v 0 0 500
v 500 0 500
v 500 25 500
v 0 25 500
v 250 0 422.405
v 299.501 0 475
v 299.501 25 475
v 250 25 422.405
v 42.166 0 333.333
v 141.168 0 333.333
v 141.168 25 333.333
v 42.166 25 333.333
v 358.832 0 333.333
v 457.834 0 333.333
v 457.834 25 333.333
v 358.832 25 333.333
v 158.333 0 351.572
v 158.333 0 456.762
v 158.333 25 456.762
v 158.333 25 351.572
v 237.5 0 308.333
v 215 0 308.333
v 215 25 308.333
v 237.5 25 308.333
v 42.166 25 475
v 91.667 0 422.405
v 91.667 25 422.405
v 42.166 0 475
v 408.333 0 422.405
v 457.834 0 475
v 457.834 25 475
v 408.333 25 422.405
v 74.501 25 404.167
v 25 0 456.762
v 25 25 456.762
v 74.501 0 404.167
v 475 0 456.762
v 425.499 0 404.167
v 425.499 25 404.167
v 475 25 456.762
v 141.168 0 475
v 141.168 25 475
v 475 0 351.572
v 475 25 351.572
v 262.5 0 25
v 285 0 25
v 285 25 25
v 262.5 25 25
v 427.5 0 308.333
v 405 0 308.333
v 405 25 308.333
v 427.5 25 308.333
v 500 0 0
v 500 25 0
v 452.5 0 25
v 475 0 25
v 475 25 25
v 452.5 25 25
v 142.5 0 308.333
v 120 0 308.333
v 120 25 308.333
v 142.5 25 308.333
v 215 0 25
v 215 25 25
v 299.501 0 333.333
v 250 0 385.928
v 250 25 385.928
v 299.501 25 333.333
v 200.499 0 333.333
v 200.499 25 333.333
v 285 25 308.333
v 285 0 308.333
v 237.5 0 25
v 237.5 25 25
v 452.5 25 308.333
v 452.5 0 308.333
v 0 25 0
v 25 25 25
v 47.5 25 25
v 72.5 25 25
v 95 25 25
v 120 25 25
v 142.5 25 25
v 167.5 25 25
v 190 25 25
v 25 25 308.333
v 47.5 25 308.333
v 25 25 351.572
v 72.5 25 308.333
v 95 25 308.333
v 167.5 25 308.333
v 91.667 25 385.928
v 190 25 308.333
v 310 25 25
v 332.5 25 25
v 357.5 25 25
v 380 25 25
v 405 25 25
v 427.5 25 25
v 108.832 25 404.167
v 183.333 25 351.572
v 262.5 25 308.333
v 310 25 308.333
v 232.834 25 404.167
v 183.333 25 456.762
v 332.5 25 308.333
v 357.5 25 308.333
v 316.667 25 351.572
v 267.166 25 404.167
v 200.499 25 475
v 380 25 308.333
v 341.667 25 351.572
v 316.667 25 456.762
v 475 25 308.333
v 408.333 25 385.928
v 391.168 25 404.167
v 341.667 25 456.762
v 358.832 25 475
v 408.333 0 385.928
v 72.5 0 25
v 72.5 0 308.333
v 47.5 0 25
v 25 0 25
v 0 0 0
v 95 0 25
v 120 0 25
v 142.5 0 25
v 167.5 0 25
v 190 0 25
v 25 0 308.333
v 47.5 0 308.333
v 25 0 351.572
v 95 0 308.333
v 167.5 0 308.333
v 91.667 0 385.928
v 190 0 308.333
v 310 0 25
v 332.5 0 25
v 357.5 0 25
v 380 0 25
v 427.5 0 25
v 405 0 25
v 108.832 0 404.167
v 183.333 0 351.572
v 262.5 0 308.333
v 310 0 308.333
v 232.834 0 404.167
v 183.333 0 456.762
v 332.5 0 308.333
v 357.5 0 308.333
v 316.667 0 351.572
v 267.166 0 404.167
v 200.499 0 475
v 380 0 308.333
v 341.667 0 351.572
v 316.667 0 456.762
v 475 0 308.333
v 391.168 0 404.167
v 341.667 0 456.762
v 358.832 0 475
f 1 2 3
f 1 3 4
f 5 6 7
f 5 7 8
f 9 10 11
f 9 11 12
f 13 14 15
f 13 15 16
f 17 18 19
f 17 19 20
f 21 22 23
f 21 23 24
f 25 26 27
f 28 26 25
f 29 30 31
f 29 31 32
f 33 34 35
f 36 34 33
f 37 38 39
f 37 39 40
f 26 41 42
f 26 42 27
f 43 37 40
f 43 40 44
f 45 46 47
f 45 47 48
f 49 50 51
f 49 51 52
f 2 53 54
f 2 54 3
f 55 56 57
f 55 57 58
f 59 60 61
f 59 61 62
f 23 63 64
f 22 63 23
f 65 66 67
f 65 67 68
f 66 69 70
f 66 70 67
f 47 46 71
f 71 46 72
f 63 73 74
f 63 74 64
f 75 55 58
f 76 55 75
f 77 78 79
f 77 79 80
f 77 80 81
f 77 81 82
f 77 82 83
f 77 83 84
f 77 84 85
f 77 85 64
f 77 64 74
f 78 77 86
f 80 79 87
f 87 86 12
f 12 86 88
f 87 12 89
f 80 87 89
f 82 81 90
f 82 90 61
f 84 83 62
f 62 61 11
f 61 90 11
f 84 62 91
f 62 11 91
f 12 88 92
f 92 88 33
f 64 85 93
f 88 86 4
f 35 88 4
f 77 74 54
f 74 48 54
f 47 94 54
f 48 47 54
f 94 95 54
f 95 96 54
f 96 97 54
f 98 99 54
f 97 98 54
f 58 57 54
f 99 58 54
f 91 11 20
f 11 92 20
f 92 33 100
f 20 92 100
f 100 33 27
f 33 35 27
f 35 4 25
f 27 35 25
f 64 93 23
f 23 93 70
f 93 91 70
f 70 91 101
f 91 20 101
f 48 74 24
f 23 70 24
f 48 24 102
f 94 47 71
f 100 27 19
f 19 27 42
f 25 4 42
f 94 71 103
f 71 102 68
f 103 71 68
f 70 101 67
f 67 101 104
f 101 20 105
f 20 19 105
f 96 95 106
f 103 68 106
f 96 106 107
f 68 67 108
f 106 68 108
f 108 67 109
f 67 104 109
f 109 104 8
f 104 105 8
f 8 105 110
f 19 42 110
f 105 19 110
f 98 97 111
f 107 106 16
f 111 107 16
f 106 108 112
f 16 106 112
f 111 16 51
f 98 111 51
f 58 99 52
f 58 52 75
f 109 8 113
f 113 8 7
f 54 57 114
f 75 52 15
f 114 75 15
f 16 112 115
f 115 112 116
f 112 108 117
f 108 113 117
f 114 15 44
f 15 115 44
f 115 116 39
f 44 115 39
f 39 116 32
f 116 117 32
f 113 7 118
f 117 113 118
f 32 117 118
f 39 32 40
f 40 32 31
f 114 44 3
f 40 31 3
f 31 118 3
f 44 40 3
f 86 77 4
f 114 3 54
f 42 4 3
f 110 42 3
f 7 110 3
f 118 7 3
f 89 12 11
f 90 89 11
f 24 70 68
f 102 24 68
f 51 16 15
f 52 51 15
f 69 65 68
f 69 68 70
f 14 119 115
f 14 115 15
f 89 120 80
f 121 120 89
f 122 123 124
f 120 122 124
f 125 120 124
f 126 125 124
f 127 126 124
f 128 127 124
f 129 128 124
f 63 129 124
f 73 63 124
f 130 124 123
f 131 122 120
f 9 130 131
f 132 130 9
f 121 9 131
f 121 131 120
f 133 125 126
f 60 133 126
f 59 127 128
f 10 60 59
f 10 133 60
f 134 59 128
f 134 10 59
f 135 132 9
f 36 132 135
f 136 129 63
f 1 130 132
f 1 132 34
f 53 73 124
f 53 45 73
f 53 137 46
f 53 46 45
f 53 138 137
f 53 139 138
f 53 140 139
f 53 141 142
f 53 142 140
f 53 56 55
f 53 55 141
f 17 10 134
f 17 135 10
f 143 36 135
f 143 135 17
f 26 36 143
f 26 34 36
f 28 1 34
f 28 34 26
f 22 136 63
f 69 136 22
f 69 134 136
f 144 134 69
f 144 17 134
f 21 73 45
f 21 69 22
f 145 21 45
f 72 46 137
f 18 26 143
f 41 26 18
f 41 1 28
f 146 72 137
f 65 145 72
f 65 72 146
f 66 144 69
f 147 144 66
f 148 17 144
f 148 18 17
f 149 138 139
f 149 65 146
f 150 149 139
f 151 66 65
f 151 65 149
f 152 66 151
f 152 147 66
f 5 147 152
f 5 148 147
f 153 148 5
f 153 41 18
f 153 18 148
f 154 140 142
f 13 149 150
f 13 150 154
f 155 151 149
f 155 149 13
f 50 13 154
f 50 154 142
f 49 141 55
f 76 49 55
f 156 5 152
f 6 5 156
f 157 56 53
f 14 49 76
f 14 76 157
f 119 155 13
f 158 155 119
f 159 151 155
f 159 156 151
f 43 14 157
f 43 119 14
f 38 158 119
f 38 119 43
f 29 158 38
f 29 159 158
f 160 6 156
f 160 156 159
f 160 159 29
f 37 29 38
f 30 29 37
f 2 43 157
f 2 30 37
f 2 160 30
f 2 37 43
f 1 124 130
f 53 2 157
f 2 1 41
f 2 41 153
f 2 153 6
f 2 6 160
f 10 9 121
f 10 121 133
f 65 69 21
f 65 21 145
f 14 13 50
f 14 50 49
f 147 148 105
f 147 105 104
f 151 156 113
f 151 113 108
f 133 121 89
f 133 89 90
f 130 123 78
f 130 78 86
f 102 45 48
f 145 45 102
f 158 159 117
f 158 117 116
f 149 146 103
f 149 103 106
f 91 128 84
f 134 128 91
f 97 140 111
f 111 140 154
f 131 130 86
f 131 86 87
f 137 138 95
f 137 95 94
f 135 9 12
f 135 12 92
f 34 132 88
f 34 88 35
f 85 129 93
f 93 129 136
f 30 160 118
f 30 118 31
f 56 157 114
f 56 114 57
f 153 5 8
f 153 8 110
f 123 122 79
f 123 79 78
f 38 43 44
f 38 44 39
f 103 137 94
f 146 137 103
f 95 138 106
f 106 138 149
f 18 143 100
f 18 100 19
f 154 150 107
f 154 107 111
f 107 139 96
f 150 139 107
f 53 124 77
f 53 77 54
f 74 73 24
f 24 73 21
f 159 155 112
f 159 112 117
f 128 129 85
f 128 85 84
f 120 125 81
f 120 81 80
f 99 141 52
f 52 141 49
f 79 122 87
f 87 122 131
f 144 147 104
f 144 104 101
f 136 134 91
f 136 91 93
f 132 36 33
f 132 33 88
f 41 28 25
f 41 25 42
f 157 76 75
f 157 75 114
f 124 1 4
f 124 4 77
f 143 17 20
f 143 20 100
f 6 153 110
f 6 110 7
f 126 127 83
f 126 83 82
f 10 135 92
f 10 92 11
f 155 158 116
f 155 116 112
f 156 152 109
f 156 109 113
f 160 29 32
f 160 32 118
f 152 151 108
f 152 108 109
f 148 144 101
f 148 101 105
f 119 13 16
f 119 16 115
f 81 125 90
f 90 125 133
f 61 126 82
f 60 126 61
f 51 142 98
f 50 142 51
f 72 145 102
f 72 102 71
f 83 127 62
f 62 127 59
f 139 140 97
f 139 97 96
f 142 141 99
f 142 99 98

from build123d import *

# Parameters (mm, degrees)
F0_W     = 25
F0_H     = 283.3333333333
F1_DEPTH = 25


with BuildPart() as f1:
    # F0 (on Front) → F1 (new body)
    with BuildSketch(Plane.XZ):
        Polygon((0, 500), (0, 0), (25, 25), (25, 308.3333333333), (25, 333.3333333333), (25, 351.5717982238), (25, 456.7615351095), (25, 475), align=None)
        Polygon((500, 500), (0, 500), (25, 475), (42.1656140146, 475), (141.1677193187, 475), (158.3333333333, 475), (183.3333333333, 475), (200.4989473479, 475), (299.5010526521, 475), (316.6666666667, 475), (341.6666666667, 475), (358.8322806813, 475), (457.8343859854, 475), (475, 475), align=None)
        Polygon((475, 25), (500, 0), (500, 500), (475, 475), (475, 456.7615351095), (475, 351.5717982238), (475, 333.3333333333), (475, 308.3333333333), align=None)
        Polygon((25, 25), (0, 0), (500, 0), (475, 25), (452.5, 25), (427.5, 25), (405, 25), (380, 25), (357.5, 25), (332.5, 25), (310, 25), (285, 25), (262.5, 25), (237.5, 25), (215, 25), (190, 25), (167.5, 25), (142.5, 25), (120, 25), (95, 25), (72.5, 25), (47.5, 25), align=None)
        Polygon((25, 351.5717982238), (25, 333.3333333333), (42.1656140146, 333.3333333333), (91.6666666667, 385.9282017762), (74.5010526521, 404.1666666667), align=None)
        Polygon((42.1656140146, 475), (25, 475), (25, 456.7615351095), (74.5010526521, 404.1666666667), (91.6666666667, 385.9282017762), (141.1677193187, 333.3333333333), (158.3333333333, 333.3333333333), (158.3333333333, 351.5717982238), (108.8322806813, 404.1666666667), (91.6666666667, 422.4051315572), align=None)
        Polygon((158.3333333333, 475), (141.1677193187, 475), (91.6666666667, 422.4051315572), (108.8322806813, 404.1666666667), (158.3333333333, 456.7615351095), align=None)
        Polygon((183.3333333333, 475), (158.3333333333, 475), (158.3333333333, 456.7615351095), (158.3333333333, 351.5717982238), (158.3333333333, 333.3333333333), (183.3333333333, 333.3333333333), (183.3333333333, 351.5717982238), (183.3333333333, 456.7615351095), align=None)
        Polygon((200.4989473479, 475), (183.3333333333, 475), (183.3333333333, 456.7615351095), (232.8343859854, 404.1666666667), (250, 385.9282017762), (299.5010526521, 333.3333333333), (316.6666666667, 333.3333333333), (316.6666666667, 351.5717982238), (267.1656140146, 404.1666666667), (250, 422.4051315572), align=None)
        Polygon((183.3333333333, 351.5717982238), (183.3333333333, 333.3333333333), (200.4989473479, 333.3333333333), (250, 385.9282017762), (232.8343859854, 404.1666666667), align=None)
        Polygon((316.6666666667, 456.7615351095), (316.6666666667, 475), (299.5010526521, 475), (250, 422.4051315572), (267.1656140146, 404.1666666667), align=None)
        Polygon((341.6666666667, 456.7615351095), (341.6666666667, 475), (316.6666666667, 475), (316.6666666667, 456.7615351095), (316.6666666667, 351.5717982238), (316.6666666667, 333.3333333333), (341.6666666667, 333.3333333333), (341.6666666667, 351.5717982238), align=None)
        Polygon((457.8343859854, 333.3333333333), (475, 333.3333333333), (475, 351.5717982238), (425.4989473479, 404.1666666667), (408.3333333333, 422.4051315572), (358.8322806813, 475), (341.6666666667, 475), (341.6666666667, 456.7615351095), (391.1677193187, 404.1666666667), (408.3333333333, 385.9282017762), align=None)
        Polygon((475, 456.7615351095), (475, 475), (457.8343859854, 475), (408.3333333333, 422.4051315572), (425.4989473479, 404.1666666667), align=None)
        Polygon((341.6666666667, 333.3333333333), (358.8322806813, 333.3333333333), (408.3333333333, 385.9282017762), (391.1677193187, 404.1666666667), (341.6666666667, 351.5717982238), align=None)
        Polygon((25, 333.3333333333), (25, 308.3333333333), (47.5, 308.3333333333), (72.5, 308.3333333333), (95, 308.3333333333), (120, 308.3333333333), (142.5, 308.3333333333), (167.5, 308.3333333333), (190, 308.3333333333), (215, 308.3333333333), (237.5, 308.3333333333), (262.5, 308.3333333333), (285, 308.3333333333), (310, 308.3333333333), (332.5, 308.3333333333), (357.5, 308.3333333333), (380, 308.3333333333), (405, 308.3333333333), (427.5, 308.3333333333), (452.5, 308.3333333333), (475, 308.3333333333), (475, 333.3333333333), (457.8343859854, 333.3333333333), (358.8322806813, 333.3333333333), (341.6666666667, 333.3333333333), (316.6666666667, 333.3333333333), (299.5010526521, 333.3333333333), (200.4989473479, 333.3333333333), (183.3333333333, 333.3333333333), (158.3333333333, 333.3333333333), (141.1677193187, 333.3333333333), (42.1656140146, 333.3333333333), align=None)
        with Locations((60, 166.6666666667)):
            Rectangle(F0_W, F0_H)
        with Locations((107.5, 166.6666666667)):
            Rectangle(F0_W, F0_H)
        with Locations((155, 166.6666666667)):
            Rectangle(F0_W, F0_H)
        with Locations((202.5, 166.6666666667)):
            Rectangle(F0_W, F0_H)
        with Locations((250, 166.6666666667)):
            Rectangle(F0_W, F0_H)
        with Locations((297.5, 166.6666666667)):
            Rectangle(F0_W, F0_H)
        with Locations((345, 166.6666666667)):
            Rectangle(F0_W, F0_H)
        with Locations((392.5, 166.6666666667)):
            Rectangle(F0_W, F0_H)
        with Locations((440, 166.6666666667)):
            Rectangle(F0_W, F0_H)
    extrude(amount=-F1_DEPTH)


solid = f1.part
